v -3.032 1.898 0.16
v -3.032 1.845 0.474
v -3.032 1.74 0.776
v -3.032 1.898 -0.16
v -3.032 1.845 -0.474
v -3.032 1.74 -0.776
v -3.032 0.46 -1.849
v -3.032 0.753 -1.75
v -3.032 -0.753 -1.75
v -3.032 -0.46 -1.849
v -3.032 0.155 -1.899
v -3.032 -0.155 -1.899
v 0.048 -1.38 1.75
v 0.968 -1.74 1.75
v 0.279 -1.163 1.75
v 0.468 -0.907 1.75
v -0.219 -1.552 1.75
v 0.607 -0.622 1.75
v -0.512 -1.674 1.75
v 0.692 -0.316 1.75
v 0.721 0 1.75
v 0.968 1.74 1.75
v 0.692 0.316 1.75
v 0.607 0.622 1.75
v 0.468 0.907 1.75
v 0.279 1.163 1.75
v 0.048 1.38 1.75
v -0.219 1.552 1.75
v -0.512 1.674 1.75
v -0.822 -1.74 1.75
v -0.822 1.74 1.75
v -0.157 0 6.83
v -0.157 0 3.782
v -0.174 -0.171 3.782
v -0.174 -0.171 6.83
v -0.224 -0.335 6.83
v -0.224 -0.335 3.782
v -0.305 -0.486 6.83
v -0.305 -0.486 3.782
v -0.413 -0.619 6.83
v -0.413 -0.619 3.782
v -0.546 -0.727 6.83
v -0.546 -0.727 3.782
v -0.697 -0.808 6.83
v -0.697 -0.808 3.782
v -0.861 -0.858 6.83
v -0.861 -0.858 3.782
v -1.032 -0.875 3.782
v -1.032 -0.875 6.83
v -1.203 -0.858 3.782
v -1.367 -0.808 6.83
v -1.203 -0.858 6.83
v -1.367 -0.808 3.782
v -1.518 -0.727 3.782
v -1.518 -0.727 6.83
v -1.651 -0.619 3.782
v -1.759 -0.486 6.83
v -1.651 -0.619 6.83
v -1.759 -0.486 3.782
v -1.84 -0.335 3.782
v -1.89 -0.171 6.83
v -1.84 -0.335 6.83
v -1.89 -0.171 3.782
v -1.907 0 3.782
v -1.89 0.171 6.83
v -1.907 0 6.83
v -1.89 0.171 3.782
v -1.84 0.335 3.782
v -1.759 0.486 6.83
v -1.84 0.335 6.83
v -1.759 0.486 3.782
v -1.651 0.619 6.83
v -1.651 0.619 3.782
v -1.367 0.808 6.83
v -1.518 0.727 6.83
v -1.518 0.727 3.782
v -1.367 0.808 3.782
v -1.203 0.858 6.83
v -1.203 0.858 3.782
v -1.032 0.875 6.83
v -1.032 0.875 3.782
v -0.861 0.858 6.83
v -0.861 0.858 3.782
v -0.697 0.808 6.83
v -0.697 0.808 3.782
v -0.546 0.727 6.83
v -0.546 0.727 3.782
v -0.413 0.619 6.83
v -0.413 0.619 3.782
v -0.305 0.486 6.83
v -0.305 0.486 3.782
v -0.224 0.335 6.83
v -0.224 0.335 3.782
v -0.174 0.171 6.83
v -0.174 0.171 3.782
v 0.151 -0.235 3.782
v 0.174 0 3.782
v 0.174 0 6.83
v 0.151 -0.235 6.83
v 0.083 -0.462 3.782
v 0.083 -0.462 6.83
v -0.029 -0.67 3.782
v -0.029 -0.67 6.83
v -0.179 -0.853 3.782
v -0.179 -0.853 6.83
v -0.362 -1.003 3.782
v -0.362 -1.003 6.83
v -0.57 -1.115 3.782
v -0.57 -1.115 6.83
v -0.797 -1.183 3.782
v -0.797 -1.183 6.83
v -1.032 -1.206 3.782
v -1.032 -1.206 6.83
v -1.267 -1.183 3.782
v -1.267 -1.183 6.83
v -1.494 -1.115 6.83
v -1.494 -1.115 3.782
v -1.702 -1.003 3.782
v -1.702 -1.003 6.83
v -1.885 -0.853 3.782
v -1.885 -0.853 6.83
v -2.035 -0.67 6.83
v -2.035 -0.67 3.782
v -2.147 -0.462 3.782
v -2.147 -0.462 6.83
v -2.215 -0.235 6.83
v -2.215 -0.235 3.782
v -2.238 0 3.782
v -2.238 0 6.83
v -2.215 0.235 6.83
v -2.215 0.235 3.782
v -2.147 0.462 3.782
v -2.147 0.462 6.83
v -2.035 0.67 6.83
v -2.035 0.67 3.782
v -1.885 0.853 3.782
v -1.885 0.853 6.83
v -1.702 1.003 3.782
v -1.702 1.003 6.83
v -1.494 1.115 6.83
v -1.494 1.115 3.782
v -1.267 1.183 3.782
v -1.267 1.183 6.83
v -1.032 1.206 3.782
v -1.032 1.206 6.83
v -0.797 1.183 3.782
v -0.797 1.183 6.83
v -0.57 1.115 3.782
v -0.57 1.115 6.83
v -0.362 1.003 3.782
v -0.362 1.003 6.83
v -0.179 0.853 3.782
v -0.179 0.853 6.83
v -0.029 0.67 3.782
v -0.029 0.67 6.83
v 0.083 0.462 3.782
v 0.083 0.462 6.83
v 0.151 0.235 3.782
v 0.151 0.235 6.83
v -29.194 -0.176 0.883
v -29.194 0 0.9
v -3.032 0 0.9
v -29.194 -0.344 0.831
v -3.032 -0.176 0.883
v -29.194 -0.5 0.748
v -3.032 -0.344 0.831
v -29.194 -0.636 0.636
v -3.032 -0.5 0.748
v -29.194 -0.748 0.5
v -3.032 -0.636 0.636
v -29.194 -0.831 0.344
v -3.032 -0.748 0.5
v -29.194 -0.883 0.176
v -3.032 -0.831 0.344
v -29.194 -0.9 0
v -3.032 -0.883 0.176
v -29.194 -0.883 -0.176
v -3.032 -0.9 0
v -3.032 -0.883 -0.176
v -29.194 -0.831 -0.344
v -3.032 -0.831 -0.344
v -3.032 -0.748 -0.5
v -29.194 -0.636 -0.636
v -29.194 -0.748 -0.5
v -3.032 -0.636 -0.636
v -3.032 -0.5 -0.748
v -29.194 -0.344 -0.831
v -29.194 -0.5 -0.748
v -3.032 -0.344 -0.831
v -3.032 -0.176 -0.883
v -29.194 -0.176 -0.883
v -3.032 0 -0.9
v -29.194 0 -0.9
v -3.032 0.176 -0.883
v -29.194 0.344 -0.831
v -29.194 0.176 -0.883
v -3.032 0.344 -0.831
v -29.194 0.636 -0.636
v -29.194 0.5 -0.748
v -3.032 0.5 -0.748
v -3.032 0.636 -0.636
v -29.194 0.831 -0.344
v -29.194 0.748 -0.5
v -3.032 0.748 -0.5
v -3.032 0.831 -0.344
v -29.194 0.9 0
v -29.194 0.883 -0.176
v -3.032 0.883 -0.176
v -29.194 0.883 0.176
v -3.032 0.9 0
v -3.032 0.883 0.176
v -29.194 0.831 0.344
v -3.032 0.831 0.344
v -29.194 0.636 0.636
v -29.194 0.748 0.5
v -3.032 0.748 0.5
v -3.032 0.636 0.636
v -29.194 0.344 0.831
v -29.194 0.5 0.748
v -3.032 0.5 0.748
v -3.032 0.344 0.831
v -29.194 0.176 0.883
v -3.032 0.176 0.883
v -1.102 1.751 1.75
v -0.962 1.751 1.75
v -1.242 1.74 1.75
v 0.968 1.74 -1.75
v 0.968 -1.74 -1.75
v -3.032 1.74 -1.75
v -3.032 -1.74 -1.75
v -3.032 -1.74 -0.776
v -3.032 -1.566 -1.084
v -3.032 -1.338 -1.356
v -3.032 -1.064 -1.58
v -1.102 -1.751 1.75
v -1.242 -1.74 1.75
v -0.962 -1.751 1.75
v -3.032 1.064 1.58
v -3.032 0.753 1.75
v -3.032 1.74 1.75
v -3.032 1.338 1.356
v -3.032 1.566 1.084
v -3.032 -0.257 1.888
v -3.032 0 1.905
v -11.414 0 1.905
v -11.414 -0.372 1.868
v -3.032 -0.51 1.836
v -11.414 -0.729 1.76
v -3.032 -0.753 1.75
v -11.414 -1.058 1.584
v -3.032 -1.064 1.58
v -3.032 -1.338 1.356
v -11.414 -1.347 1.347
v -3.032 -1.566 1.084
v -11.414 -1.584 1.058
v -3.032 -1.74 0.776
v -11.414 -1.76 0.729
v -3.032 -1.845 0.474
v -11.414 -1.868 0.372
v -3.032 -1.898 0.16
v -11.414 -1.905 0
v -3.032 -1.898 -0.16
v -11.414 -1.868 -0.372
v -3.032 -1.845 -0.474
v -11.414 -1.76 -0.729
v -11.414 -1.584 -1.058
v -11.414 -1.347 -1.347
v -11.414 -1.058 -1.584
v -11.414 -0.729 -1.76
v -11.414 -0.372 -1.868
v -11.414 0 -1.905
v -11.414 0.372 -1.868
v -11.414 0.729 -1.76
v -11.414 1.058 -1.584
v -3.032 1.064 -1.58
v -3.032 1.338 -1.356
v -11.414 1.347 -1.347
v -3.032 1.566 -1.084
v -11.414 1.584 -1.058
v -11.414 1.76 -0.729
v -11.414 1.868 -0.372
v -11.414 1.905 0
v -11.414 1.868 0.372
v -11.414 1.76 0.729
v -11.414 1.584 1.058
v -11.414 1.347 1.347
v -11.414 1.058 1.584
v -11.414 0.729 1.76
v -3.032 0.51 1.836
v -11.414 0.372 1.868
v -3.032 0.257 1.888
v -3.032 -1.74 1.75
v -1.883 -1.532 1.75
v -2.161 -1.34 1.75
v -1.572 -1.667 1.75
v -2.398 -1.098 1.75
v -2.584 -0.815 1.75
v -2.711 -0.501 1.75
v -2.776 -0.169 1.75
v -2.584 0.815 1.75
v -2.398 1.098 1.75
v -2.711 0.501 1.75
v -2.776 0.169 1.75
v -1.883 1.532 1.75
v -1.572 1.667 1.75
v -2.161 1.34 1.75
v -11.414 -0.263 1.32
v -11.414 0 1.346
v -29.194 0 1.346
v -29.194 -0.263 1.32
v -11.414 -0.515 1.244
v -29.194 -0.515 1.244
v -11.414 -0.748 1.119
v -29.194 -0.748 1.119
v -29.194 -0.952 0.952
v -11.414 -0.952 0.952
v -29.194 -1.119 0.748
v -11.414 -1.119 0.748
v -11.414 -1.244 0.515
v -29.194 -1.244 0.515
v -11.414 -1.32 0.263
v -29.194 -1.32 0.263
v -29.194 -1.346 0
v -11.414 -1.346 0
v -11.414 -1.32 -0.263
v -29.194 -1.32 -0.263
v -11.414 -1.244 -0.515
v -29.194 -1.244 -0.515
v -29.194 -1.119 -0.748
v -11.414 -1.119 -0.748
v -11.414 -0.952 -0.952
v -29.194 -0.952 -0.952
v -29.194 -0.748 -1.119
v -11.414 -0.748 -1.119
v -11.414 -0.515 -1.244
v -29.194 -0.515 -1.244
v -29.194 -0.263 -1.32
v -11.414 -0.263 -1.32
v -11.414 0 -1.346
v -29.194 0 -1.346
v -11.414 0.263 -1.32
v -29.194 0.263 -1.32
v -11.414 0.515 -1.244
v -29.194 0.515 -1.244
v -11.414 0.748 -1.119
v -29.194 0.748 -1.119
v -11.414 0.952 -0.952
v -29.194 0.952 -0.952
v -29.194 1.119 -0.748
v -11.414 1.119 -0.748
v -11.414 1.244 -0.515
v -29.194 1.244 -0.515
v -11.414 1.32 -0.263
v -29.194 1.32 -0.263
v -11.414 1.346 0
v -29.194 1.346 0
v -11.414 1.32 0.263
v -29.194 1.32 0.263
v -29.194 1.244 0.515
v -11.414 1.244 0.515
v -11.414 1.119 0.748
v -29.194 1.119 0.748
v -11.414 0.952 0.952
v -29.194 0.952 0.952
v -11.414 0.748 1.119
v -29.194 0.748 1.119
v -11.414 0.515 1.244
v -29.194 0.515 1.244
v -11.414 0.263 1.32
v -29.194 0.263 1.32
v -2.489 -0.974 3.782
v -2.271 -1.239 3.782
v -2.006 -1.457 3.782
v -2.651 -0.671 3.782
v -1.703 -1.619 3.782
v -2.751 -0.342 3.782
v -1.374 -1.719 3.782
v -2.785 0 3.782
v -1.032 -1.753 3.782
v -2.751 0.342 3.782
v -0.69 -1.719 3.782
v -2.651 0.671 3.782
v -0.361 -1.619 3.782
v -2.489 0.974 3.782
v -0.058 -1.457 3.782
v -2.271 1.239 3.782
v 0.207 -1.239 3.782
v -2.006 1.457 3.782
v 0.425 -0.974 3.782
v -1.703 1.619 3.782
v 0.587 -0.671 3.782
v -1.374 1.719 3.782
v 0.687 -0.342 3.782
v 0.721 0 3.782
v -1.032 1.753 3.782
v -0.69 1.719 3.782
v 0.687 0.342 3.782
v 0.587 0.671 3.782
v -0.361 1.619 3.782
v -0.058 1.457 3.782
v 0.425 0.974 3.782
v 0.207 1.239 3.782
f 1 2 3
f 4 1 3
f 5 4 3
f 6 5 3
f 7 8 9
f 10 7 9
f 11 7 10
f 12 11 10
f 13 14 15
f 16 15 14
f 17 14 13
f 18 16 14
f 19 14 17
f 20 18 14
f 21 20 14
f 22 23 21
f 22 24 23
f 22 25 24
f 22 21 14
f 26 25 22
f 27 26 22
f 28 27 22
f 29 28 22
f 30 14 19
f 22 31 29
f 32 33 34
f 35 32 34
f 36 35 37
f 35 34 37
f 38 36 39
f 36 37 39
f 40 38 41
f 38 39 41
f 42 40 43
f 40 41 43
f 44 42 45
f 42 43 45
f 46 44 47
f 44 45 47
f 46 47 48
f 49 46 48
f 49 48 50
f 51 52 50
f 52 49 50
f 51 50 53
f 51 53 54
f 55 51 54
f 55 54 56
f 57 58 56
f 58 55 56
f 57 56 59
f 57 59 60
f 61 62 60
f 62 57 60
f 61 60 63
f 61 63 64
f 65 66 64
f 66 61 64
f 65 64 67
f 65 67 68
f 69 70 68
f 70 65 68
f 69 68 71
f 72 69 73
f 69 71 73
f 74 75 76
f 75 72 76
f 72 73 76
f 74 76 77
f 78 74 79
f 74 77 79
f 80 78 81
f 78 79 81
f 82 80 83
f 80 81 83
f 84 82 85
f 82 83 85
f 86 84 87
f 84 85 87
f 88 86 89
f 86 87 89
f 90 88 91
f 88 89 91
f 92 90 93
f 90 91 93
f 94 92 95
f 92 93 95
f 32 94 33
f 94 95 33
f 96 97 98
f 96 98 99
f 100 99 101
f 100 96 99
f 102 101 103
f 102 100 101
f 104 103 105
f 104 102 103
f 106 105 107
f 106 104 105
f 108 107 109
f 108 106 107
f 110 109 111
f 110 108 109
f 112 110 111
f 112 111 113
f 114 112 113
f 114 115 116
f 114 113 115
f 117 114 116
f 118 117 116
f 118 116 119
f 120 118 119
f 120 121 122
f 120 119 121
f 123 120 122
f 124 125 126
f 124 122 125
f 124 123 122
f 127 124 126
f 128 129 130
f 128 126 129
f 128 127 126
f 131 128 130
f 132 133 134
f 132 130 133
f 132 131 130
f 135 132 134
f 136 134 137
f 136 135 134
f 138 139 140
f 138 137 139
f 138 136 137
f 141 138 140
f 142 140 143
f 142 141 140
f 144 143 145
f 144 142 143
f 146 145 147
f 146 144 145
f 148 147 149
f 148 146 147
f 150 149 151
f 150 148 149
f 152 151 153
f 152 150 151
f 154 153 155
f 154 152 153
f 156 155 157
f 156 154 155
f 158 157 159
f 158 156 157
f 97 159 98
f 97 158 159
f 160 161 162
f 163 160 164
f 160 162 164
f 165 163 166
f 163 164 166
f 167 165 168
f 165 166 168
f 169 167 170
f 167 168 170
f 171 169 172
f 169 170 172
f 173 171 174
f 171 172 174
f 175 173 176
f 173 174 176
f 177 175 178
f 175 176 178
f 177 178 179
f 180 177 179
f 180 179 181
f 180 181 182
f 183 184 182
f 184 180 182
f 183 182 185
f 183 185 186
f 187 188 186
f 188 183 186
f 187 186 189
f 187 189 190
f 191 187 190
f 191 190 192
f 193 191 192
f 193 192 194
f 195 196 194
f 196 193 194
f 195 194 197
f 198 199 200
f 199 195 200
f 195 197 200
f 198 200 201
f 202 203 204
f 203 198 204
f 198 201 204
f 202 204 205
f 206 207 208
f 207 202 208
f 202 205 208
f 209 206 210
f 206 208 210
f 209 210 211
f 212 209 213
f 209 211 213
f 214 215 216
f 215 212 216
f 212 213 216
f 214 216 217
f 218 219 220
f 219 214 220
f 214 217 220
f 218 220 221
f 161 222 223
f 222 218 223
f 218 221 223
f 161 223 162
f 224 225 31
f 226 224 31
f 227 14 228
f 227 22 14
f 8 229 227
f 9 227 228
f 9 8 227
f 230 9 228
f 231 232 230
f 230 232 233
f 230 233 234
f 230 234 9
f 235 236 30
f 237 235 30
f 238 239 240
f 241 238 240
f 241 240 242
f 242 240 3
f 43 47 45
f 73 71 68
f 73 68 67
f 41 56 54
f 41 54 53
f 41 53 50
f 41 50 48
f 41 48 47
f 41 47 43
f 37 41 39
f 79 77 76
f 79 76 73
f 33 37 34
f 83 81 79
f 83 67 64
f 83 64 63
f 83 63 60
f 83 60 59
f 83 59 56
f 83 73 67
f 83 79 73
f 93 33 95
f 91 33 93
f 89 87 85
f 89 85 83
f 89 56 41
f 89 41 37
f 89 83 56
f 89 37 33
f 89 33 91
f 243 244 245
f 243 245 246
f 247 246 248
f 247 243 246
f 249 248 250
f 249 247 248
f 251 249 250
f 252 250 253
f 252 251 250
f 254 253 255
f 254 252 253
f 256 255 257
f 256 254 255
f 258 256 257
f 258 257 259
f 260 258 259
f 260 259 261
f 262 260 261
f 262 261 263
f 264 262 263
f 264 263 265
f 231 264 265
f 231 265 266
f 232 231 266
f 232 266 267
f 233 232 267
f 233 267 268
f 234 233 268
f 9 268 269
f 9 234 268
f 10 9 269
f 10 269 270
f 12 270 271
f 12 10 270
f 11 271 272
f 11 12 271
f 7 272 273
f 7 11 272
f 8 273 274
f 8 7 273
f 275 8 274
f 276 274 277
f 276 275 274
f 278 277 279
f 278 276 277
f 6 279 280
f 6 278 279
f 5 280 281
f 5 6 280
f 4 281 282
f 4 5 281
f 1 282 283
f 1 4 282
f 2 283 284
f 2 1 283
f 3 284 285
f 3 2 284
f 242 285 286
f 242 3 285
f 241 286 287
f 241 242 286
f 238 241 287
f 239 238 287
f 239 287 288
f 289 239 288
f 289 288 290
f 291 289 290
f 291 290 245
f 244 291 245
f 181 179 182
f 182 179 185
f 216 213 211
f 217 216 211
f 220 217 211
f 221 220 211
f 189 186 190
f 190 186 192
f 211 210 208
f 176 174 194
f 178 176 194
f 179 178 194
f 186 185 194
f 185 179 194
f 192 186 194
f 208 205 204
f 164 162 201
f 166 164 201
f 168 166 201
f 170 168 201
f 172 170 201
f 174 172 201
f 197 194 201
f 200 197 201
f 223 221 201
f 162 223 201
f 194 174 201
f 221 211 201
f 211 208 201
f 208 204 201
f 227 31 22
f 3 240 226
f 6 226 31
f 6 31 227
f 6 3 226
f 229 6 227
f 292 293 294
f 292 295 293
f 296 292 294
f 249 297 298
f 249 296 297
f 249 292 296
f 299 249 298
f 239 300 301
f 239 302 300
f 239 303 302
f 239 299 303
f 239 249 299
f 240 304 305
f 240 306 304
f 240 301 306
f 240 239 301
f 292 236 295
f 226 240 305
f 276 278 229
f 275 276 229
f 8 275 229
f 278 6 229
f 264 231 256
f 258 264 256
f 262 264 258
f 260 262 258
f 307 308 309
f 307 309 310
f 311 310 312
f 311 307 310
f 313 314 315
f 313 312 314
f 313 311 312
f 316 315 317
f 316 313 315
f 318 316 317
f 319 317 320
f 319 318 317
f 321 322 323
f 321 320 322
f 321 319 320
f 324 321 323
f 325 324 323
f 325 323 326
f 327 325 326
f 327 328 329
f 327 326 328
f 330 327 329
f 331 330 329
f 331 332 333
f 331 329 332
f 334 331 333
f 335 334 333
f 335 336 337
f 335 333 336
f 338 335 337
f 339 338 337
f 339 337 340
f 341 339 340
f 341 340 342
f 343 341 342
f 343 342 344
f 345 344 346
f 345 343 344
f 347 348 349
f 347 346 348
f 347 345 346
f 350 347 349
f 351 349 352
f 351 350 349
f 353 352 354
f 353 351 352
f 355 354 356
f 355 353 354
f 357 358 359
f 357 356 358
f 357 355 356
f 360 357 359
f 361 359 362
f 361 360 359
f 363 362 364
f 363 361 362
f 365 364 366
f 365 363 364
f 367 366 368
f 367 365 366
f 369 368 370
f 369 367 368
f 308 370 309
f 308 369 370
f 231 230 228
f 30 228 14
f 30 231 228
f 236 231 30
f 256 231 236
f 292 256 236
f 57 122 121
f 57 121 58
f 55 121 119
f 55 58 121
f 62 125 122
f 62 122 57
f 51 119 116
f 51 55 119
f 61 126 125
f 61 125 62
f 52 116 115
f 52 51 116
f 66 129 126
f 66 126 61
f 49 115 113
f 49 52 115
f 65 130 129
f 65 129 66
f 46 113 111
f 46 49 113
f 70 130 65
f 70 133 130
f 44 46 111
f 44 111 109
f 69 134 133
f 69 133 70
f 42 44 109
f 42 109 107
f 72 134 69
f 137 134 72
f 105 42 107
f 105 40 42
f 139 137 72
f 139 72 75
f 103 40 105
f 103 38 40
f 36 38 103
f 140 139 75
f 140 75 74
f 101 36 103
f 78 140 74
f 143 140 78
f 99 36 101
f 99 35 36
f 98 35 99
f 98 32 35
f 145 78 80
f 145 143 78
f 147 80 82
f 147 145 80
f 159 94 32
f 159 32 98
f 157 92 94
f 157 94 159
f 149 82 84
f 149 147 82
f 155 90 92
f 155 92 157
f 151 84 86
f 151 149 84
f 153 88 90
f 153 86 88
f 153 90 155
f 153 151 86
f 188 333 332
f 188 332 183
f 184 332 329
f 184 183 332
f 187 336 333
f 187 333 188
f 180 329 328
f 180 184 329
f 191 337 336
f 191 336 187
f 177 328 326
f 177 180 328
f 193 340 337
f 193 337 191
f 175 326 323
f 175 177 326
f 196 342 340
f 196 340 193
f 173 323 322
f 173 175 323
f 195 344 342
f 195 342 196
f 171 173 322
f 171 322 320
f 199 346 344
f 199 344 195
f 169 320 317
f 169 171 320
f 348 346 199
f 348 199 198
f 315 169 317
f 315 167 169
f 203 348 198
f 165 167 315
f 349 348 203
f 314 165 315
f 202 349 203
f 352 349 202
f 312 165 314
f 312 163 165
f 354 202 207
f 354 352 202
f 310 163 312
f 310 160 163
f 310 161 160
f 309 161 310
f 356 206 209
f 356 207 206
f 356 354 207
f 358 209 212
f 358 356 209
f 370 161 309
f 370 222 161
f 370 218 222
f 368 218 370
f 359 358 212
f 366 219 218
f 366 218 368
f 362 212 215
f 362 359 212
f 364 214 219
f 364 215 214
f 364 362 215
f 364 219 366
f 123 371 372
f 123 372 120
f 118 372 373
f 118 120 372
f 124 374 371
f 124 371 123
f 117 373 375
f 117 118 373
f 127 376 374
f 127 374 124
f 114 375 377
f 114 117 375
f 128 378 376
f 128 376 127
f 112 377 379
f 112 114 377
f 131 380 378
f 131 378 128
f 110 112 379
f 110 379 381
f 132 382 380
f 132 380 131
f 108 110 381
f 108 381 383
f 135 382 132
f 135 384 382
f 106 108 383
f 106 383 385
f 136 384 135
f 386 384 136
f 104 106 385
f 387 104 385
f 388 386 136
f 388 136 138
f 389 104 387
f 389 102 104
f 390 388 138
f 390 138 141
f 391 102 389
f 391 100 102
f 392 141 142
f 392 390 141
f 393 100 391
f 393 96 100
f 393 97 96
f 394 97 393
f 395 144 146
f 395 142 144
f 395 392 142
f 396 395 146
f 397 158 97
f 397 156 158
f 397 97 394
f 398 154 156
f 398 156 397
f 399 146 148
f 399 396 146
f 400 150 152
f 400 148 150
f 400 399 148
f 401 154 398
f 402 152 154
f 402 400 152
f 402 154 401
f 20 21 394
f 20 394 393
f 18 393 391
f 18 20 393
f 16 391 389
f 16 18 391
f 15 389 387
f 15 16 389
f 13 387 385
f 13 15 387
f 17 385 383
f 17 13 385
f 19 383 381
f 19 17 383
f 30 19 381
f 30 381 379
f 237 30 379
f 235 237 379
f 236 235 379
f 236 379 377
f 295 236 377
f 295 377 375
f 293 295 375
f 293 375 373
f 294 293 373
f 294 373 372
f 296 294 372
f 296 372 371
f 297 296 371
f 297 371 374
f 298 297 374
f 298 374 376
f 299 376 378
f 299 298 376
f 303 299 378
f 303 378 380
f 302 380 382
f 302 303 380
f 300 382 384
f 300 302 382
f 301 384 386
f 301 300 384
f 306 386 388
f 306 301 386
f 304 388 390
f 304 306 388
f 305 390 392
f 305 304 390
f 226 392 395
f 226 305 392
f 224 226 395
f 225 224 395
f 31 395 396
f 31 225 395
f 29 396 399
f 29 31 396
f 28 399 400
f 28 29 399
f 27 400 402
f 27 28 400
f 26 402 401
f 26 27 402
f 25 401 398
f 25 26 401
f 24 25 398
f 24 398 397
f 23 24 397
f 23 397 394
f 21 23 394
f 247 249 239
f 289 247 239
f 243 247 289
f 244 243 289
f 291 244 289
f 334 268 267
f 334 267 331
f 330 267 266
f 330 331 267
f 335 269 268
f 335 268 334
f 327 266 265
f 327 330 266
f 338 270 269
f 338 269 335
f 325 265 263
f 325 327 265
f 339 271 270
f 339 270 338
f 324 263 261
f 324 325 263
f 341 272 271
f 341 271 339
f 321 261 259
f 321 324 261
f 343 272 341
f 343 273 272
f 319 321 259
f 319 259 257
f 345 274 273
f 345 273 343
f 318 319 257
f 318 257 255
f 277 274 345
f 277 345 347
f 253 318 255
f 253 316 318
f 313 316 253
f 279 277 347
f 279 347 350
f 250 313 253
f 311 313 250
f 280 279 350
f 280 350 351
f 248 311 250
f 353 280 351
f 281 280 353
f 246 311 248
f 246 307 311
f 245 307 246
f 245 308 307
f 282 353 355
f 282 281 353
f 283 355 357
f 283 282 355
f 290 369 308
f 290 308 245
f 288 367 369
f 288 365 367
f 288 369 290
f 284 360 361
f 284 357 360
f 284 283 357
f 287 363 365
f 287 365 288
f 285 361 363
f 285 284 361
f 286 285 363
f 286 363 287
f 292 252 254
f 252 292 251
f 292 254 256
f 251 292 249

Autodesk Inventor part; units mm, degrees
ref_plane "XZ Plane" through (0, 0, 0) normal (0, 1, 0) x (-1, 0, 0)
sketch "Sketch2" plane through (0, 0, 0) normal (0, 1, 0) x (-1, 0, 0)
  line L0 (0, 0) -> (-5, 0)
  line L1 (-5, 0) -> (-10, 1.6)
  line L2 (-10, 1.6) -> (-15, 1.6)
  dimension "d0" = 1.6
  dimension "d1" = 5
  dimension "d2" = 5
  dimension "d3" = 5
sketch "Sketch3" plane through (0, 0, 0) normal (1, 0, 0) x (0, 1, 0)
  circle A0 centre (0, 0) radius 0.9
  dimension "d4" = 1.8
sweep "Sweep1" [suppressed]
ref_plane "Work Plane1" through (0, 0, 1.6) normal (0, 0, 1) x (1, 0, 0)
sketch "Sketch4" plane through (0, 0, 1.6) normal (0, 0, 1) x (1, 0, 0)
  line L0 (25, -15) -> (25, -66.3933)
  line L1 (0, 0) -> (10, 0)
  arc A0 (25, -15) -> (10, 0) centre (10, -15) ccw
  dimension "d33" = 15
  dimension "d34" = 25
  dimension "d35" = 51.3933
ref_plane "Work Plane2" through (15, 0, 0) normal (1, 0, 0) x (0, 1, 0)
sketch "Sketch5" plane through (15, 0, 0) normal (1, 0, 0) x (0, 1, 0)
  circle A0 centre (0, 1.6) radius 0.9
  point P0 (0, 0)
  dimension "d16" = 1.6
  dimension "d17" = 1.8
sweep "Sweep2" [suppressed]
sketch "Sketch7" plane through (0, 0, 0) normal (1, 0, 0) x (0, 1, 0)
  circle A0 centre (0, 0) radius 0.9
  circle A1 centre (0, 0) radius 1.2065
  dimension "d21" = 2.413
extrude "true_tip" add sketch "Sketch7" against normal blind 1
sketch "Sketch8" plane through (-1, 0, 0) normal (-1, 0, 0) x (0, 0, 1)
  circle A0 centre (0, 0) radius 0.9 projected
  circle A1 centre (0, 0) radius 1.2065 projected
  circle A2 centre (0, 0) radius 1
  dimension "d24" = 2
extrude "shoulder_tip" add sketch "Sketch8" along normal blind 2.032 contours A2
sketch "Sketch9" plane through (-3.032, 0, 0) normal (-1, 0, 0) x (0, 0, 1)
  circle A0 centre (0, 0) radius 0.9 projected
  circle A1 centre (0, 0) radius 1 projected
  circle A2 centre (0, 0) radius 1.905
  dimension "d27" = 3.81
extrude "thick" add sketch "Sketch9" along normal blind 8.382 contours A1 | A2
sketch "Sketch10" plane through (-11.414, 0, 0) normal (-1, 0, 0) x (0, 0, 1)
  circle A0 centre (0, 0) radius 0.9 projected
  circle A1 centre (0, 0) radius 1.905 projected
  circle A2 centre (0, 0) radius 1.3462
  dimension "d30" = 2.6924
extrude "thin" add sketch "Sketch10" along normal blind 17.78 contours A2
sketch "Sketch11" plane through (-3.032, 0, 0) normal (1, 0, 0) x (0, 0, -1)
  circle A0 centre (0, 0) radius 1 projected
  line L0 (-1.75, 1.74) -> (1.75, 1.74)
  line L1 (1.75, 1.74) -> (1.75, -1.74)
  line L2 (1.75, -1.74) -> (-1.75, -1.74)
  line L3 (-1.75, -1.74) -> (-1.75, 1.74)
  line L4 (0, 0) -> (1.75, 0)
  line L5 (0, 0) -> (0, 1.74)
  dimension "d36" = 3.48
  dimension "d37" = 3.5
extrude "right_angle" add sketch "Sketch11" along normal blind 4
sketch "Sketch12" plane through (-3.032, -1.74, 1.75) normal (0, 0, 1) x (1, 0, 0)
  line L0 (0, 0) -> (4, 3.48) construction
  line L1 (0, 3.48) -> (4, 0) construction
  circle A0 centre (2, 1.74) radius 1.7526
  point P0 (3.032, 1.74)
  dimension "d40" = 3.5052
extrude "Extrusion6" add sketch "Sketch12" along normal blind 2.032
sketch "Sketch13" plane through (-1.032, 0, 3.782) normal (0, 0, 1) x (1, 0, 0)
  circle A0 centre (0, 0) radius 1.7526 projected
  circle A1 centre (0, 0) radius 1.2065
  circle A2 centre (0, 0) radius 0.8748
  point P0 (1.032, 0)
  dimension "d43" = 2.413
extrude "Extrusion7" add sketch "Sketch13" along normal blind 3.048 contours A1
properties part number "mmcx_ra_coax_tip"
